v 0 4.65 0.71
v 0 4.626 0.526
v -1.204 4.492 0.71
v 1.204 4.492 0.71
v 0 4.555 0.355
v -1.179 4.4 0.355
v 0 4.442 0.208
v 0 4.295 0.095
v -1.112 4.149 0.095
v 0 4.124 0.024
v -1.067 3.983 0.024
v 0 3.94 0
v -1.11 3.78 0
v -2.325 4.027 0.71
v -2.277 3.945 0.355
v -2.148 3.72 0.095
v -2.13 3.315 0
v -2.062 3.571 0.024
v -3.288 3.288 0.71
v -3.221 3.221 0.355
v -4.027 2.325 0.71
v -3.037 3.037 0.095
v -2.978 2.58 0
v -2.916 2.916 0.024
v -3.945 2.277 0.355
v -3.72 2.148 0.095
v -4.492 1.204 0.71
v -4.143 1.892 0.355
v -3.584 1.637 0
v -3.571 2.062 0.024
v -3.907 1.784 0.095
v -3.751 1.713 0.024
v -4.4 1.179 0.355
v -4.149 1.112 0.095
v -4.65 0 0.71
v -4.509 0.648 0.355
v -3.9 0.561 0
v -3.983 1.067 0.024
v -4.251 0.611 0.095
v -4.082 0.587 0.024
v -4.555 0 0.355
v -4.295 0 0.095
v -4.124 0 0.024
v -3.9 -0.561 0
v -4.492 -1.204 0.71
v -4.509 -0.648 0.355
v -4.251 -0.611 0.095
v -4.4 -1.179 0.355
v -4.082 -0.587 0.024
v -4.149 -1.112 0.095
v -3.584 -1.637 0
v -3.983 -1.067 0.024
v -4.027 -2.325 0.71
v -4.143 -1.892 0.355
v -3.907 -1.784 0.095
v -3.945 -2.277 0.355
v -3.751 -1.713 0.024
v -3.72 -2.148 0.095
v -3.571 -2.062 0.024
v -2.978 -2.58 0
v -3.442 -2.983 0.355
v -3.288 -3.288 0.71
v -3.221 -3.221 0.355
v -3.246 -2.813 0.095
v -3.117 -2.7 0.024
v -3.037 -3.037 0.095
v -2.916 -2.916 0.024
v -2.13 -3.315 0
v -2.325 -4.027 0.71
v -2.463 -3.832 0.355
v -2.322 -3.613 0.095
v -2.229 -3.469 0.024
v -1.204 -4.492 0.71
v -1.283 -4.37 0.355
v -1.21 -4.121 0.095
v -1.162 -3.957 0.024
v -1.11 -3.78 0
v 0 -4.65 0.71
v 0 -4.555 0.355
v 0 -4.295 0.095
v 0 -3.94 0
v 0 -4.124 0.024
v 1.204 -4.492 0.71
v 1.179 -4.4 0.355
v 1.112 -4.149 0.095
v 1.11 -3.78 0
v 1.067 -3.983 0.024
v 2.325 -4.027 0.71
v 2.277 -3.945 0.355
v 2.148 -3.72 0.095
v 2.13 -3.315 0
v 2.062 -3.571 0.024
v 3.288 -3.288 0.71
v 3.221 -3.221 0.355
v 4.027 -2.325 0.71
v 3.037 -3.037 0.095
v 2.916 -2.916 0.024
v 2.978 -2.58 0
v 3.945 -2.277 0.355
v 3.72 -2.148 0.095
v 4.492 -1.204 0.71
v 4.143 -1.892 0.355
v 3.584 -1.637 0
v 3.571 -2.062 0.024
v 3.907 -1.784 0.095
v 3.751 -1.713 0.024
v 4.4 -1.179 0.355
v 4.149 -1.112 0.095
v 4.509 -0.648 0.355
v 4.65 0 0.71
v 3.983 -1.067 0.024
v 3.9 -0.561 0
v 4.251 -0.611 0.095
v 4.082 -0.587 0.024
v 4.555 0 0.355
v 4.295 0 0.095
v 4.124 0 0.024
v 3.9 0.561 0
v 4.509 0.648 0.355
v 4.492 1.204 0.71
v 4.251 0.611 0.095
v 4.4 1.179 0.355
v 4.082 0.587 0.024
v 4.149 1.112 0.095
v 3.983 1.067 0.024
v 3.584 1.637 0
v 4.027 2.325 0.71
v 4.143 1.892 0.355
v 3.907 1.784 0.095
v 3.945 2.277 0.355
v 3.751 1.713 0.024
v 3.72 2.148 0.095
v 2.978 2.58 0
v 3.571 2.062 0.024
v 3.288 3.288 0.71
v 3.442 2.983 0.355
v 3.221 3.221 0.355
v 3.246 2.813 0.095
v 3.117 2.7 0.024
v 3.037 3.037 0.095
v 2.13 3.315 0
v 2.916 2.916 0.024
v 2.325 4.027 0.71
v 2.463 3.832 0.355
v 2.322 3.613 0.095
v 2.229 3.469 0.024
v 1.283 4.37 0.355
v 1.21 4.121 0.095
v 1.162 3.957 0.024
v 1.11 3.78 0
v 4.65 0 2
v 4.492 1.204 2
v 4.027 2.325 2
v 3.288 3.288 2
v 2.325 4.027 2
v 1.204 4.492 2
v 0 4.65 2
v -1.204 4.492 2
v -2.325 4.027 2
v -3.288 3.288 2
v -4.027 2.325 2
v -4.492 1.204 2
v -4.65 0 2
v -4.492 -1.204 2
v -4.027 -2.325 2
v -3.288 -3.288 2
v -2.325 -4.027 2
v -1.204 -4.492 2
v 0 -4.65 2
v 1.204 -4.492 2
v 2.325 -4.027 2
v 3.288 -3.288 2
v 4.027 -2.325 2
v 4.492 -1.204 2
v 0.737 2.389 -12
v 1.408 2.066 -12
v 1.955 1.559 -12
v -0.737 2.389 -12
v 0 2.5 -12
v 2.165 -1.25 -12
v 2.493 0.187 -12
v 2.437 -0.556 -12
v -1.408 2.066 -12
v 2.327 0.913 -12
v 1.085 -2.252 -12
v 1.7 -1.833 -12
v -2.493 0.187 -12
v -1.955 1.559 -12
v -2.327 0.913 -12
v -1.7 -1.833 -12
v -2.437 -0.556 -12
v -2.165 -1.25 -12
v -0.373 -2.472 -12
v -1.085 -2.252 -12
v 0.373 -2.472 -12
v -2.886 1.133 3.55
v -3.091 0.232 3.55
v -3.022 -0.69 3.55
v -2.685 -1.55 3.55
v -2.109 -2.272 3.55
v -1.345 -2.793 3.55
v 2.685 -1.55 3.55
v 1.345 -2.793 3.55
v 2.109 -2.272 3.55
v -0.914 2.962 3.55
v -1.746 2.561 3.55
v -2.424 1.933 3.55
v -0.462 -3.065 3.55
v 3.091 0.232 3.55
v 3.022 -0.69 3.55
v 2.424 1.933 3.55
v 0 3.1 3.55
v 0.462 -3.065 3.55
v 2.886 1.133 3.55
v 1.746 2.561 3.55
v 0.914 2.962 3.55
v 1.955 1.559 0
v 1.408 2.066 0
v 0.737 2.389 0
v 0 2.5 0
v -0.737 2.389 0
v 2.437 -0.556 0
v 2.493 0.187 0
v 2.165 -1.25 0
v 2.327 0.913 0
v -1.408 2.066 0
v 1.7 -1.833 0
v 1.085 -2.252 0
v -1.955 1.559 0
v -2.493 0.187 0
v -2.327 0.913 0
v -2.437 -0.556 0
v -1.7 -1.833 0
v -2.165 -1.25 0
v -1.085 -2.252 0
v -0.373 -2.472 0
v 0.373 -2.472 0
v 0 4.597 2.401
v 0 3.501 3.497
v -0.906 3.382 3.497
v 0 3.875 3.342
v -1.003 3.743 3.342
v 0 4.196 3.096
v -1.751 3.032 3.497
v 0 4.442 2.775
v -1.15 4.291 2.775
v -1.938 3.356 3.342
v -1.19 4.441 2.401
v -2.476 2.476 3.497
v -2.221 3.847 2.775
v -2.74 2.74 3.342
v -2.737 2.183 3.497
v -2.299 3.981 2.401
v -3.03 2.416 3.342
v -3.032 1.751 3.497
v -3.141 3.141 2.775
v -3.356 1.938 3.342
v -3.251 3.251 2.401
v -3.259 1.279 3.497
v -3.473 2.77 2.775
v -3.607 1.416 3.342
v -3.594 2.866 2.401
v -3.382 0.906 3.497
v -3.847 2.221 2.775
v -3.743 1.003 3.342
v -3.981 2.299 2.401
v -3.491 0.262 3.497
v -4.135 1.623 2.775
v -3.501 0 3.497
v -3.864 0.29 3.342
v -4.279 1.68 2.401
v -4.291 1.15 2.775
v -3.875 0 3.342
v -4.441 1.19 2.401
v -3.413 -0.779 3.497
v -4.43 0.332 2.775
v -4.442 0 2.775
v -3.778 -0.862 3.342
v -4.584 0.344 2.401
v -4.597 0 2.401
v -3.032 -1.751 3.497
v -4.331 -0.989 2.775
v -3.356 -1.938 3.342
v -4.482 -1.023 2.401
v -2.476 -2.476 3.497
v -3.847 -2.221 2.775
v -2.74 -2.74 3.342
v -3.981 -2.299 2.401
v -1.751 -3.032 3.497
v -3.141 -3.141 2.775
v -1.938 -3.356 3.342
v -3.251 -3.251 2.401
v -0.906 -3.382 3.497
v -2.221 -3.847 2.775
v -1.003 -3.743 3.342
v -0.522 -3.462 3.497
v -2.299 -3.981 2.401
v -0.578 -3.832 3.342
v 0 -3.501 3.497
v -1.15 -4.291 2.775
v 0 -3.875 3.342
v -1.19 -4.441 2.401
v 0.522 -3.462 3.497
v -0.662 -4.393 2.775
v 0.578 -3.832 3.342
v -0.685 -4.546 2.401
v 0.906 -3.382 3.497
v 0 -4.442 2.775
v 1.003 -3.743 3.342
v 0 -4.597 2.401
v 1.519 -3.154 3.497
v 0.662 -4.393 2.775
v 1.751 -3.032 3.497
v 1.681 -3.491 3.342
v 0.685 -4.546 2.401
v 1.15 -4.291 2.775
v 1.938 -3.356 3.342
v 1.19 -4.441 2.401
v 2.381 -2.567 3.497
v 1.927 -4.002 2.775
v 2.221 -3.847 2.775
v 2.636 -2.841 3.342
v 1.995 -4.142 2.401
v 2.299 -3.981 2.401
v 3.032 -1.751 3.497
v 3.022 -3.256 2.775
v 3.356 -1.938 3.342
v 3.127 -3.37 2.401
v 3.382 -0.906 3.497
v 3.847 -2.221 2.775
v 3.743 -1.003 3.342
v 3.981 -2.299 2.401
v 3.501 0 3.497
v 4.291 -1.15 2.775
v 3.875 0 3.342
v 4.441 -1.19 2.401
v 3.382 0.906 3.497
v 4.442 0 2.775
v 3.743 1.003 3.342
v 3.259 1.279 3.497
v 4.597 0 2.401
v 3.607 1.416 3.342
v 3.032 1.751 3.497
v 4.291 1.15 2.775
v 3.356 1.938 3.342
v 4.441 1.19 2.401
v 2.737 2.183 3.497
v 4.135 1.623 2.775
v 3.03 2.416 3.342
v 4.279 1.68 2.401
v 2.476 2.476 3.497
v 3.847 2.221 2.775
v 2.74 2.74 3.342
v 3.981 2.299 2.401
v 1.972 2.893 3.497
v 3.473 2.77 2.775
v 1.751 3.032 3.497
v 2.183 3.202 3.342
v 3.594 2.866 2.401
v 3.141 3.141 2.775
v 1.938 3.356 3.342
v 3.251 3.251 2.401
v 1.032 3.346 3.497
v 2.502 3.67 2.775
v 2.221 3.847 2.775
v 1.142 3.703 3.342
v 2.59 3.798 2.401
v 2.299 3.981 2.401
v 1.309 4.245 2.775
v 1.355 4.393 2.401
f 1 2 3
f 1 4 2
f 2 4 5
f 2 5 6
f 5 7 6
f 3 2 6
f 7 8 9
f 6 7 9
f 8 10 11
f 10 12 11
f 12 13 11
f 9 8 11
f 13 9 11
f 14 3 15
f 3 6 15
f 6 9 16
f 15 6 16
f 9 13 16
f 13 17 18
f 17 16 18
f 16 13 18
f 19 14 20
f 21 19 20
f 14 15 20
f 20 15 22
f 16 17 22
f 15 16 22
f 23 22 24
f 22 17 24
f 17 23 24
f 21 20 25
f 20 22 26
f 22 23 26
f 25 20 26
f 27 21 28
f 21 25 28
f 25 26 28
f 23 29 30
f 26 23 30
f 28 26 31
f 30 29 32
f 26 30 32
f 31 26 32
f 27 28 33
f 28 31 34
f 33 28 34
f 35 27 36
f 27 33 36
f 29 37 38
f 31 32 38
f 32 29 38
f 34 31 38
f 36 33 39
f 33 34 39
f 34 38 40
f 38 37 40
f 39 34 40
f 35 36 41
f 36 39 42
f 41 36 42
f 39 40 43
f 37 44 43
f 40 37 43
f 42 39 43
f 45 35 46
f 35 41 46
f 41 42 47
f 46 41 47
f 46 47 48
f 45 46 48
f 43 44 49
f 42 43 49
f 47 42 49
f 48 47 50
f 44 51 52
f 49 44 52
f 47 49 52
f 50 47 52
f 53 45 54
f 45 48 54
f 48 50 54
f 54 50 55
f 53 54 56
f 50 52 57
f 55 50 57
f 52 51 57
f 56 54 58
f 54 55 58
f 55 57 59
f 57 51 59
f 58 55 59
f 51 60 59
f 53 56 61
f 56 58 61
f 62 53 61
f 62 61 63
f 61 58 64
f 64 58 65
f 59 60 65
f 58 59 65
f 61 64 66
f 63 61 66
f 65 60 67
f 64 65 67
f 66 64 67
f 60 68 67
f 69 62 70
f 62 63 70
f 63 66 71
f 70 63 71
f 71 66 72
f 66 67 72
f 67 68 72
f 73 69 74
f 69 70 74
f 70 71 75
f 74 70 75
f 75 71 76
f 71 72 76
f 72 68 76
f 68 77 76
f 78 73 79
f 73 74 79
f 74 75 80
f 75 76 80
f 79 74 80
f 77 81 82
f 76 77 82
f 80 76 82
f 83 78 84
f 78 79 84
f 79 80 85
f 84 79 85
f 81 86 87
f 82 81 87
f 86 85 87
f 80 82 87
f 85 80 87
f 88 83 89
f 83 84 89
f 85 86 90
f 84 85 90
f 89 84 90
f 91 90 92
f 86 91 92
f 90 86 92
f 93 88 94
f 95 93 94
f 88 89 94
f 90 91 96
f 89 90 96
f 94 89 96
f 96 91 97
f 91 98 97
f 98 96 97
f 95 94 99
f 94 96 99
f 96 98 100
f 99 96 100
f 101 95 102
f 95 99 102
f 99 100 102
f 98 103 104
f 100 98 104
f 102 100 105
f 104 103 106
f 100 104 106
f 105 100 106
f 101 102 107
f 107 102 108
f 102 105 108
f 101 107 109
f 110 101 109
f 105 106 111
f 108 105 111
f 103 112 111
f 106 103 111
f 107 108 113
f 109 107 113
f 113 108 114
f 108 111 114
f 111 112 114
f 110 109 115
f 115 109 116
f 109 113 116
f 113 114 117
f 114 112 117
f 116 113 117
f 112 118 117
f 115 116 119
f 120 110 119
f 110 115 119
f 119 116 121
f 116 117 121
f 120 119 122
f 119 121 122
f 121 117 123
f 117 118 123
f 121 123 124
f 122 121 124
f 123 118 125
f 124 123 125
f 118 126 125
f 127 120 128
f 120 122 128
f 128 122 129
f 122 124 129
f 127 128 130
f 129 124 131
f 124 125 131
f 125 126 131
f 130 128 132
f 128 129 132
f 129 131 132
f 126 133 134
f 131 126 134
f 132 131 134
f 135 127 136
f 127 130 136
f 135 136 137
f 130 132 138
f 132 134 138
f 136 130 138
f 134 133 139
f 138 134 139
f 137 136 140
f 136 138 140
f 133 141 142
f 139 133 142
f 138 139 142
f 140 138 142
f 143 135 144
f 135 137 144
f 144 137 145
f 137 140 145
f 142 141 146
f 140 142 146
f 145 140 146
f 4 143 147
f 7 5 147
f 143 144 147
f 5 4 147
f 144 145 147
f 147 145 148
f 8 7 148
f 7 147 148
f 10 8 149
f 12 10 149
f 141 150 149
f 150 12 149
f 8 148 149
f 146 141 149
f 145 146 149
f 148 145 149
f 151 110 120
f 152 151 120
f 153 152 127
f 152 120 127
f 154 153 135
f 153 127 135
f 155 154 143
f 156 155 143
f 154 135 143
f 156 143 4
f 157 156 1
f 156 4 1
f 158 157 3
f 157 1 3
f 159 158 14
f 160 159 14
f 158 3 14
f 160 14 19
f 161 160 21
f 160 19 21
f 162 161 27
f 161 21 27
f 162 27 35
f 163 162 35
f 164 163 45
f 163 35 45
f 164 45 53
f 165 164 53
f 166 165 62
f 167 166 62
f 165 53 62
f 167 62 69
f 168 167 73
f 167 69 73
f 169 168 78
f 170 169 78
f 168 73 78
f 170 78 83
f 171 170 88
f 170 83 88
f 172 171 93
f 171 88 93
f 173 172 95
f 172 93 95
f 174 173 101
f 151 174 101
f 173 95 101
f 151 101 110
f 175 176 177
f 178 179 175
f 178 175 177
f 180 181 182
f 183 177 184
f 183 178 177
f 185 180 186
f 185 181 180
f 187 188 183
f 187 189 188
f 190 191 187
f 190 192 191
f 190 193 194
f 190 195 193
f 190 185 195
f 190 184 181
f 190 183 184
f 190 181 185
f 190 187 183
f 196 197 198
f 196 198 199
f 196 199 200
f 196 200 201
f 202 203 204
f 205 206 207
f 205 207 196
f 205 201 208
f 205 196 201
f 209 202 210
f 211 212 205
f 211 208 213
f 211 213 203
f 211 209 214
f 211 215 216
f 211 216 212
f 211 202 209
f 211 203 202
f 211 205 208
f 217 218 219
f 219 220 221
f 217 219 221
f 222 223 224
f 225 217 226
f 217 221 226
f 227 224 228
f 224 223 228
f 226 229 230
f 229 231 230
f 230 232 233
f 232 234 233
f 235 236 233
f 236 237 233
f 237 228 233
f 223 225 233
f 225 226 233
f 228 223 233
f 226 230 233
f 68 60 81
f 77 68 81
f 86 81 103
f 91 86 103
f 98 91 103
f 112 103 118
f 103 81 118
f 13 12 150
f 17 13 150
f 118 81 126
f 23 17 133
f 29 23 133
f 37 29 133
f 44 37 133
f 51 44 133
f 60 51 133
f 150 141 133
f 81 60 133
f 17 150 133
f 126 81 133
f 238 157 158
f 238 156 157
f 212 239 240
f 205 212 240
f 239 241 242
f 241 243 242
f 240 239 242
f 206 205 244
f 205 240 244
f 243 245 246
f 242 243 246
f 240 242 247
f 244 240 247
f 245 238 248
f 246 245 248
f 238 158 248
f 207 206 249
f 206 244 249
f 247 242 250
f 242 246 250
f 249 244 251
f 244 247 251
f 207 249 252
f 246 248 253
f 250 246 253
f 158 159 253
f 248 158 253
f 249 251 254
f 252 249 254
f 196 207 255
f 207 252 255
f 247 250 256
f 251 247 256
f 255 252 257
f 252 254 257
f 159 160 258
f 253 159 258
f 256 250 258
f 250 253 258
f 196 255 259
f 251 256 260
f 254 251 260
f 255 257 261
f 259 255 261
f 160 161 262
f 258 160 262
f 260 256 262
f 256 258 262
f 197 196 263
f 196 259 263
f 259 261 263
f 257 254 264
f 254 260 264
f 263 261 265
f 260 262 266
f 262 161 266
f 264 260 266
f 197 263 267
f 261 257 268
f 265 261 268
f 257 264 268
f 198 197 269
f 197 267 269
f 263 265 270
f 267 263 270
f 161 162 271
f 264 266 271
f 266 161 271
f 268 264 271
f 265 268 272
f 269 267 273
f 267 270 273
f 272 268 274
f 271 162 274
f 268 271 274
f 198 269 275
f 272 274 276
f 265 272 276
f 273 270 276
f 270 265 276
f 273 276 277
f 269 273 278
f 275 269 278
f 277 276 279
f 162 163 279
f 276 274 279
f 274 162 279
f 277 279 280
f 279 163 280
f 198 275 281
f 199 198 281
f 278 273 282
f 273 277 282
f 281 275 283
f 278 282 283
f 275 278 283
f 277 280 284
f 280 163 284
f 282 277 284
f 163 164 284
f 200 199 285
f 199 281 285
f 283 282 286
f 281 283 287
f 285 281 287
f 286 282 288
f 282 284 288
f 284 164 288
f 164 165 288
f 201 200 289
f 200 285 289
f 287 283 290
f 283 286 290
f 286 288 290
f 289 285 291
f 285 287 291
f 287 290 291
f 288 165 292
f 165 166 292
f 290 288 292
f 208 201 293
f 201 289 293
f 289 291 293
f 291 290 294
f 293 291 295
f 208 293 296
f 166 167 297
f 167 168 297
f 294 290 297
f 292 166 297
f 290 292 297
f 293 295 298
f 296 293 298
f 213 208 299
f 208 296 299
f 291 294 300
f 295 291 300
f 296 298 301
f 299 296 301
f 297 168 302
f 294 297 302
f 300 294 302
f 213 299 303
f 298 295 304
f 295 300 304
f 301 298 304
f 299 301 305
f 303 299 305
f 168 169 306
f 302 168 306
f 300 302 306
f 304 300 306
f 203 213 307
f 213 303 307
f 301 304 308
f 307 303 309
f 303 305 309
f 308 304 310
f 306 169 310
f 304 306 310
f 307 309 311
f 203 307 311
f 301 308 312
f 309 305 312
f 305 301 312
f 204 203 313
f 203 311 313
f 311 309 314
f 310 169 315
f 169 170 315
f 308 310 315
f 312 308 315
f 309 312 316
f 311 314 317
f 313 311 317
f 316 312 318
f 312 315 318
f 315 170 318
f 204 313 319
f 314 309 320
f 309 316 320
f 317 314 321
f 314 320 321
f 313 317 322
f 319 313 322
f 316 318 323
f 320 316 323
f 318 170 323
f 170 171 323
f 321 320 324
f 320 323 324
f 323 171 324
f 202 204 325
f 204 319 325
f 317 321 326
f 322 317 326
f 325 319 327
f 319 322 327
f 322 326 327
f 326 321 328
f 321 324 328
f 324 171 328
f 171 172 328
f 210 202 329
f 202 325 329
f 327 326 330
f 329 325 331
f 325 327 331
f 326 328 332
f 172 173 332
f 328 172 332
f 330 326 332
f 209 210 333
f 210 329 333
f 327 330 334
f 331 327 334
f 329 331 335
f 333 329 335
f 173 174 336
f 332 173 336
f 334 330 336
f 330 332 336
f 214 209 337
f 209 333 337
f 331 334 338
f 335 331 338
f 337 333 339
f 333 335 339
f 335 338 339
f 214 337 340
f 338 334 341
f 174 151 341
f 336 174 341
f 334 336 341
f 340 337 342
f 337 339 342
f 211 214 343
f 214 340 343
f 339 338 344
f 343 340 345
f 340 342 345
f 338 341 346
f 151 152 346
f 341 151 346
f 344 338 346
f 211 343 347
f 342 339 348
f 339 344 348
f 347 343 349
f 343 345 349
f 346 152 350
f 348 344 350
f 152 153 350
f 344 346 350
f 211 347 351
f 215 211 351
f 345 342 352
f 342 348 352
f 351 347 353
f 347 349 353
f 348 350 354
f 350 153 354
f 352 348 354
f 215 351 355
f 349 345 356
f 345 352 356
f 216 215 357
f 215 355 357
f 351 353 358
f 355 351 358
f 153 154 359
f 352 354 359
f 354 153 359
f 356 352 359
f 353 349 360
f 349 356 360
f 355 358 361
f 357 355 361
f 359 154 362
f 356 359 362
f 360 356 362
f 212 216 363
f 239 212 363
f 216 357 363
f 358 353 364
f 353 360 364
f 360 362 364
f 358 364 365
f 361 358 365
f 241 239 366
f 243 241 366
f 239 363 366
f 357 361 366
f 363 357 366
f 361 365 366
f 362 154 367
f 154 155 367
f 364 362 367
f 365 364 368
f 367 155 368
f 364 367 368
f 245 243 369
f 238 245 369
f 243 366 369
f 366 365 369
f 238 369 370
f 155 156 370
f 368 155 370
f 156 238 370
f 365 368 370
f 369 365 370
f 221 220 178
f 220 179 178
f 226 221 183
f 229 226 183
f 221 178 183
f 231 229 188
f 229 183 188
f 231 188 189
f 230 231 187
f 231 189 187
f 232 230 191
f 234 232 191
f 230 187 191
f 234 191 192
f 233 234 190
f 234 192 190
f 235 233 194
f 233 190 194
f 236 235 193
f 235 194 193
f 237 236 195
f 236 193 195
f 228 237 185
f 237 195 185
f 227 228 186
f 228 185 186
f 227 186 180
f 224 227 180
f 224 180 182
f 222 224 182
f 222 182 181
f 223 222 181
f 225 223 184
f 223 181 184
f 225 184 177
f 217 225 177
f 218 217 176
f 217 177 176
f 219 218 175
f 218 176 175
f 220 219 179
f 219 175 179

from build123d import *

# Parameters (mm, degrees)
SKETCH1_R      = 4.65
EXTRUDE3_DEPTH = 3.55
SKETCH17_W     = 12
SKETCH17_H     = 2.5


with BuildPart() as part:
    # Sketch1 → Extrude3 (new body)
    with BuildSketch(Plane.XY):
        Circle(SKETCH1_R)
    extrude(amount=EXTRUDE3_DEPTH)

    # Sketch11 → Cut-Revolve3 (revolve, cut)
    with BuildSketch(Plane(origin=(0, 0, 0), x_dir=(0, 0, -1), z_dir=(1, 0, 0))):
        with BuildLine():
            Line((-2, 4.65), (-0.71, 4.65))
            ThreePointArc((-0.71, 4.65), (-0.207954185, 4.442045815), (0, 3.94))
            Line((0, 3.94), (0.254, 3.94))
            Line((0.254, 3.94), (0.254, 4.904))
            Line((0.254, 4.904), (-3.804, 4.904))
            Line((-3.804, 4.904), (-3.804, 3.1))
            Line((-3.804, 3.1), (-3.55, 3.1))
            ThreePointArc((-3.55, 3.1), (-3.096015511, 4.196015511), (-2, 4.65))
        make_face()
    revolve(axis=Axis((0, 0, 0), (0, 0, 1)), mode=Mode.SUBTRACT)


with BuildPart() as body_2:
    # Sketch17 → Revolve1 (revolve)
    with BuildSketch(Plane(origin=(0, 0, 0), x_dir=(0, 0, -1), z_dir=(1, 0, 0))):
        with Locations((6, 1.25)):
            Rectangle(SKETCH17_W, SKETCH17_H)
    revolve(axis=Axis((0, 0, 0), (0, 0, 1)))


solid = Compound([part.part, body_2.part])
